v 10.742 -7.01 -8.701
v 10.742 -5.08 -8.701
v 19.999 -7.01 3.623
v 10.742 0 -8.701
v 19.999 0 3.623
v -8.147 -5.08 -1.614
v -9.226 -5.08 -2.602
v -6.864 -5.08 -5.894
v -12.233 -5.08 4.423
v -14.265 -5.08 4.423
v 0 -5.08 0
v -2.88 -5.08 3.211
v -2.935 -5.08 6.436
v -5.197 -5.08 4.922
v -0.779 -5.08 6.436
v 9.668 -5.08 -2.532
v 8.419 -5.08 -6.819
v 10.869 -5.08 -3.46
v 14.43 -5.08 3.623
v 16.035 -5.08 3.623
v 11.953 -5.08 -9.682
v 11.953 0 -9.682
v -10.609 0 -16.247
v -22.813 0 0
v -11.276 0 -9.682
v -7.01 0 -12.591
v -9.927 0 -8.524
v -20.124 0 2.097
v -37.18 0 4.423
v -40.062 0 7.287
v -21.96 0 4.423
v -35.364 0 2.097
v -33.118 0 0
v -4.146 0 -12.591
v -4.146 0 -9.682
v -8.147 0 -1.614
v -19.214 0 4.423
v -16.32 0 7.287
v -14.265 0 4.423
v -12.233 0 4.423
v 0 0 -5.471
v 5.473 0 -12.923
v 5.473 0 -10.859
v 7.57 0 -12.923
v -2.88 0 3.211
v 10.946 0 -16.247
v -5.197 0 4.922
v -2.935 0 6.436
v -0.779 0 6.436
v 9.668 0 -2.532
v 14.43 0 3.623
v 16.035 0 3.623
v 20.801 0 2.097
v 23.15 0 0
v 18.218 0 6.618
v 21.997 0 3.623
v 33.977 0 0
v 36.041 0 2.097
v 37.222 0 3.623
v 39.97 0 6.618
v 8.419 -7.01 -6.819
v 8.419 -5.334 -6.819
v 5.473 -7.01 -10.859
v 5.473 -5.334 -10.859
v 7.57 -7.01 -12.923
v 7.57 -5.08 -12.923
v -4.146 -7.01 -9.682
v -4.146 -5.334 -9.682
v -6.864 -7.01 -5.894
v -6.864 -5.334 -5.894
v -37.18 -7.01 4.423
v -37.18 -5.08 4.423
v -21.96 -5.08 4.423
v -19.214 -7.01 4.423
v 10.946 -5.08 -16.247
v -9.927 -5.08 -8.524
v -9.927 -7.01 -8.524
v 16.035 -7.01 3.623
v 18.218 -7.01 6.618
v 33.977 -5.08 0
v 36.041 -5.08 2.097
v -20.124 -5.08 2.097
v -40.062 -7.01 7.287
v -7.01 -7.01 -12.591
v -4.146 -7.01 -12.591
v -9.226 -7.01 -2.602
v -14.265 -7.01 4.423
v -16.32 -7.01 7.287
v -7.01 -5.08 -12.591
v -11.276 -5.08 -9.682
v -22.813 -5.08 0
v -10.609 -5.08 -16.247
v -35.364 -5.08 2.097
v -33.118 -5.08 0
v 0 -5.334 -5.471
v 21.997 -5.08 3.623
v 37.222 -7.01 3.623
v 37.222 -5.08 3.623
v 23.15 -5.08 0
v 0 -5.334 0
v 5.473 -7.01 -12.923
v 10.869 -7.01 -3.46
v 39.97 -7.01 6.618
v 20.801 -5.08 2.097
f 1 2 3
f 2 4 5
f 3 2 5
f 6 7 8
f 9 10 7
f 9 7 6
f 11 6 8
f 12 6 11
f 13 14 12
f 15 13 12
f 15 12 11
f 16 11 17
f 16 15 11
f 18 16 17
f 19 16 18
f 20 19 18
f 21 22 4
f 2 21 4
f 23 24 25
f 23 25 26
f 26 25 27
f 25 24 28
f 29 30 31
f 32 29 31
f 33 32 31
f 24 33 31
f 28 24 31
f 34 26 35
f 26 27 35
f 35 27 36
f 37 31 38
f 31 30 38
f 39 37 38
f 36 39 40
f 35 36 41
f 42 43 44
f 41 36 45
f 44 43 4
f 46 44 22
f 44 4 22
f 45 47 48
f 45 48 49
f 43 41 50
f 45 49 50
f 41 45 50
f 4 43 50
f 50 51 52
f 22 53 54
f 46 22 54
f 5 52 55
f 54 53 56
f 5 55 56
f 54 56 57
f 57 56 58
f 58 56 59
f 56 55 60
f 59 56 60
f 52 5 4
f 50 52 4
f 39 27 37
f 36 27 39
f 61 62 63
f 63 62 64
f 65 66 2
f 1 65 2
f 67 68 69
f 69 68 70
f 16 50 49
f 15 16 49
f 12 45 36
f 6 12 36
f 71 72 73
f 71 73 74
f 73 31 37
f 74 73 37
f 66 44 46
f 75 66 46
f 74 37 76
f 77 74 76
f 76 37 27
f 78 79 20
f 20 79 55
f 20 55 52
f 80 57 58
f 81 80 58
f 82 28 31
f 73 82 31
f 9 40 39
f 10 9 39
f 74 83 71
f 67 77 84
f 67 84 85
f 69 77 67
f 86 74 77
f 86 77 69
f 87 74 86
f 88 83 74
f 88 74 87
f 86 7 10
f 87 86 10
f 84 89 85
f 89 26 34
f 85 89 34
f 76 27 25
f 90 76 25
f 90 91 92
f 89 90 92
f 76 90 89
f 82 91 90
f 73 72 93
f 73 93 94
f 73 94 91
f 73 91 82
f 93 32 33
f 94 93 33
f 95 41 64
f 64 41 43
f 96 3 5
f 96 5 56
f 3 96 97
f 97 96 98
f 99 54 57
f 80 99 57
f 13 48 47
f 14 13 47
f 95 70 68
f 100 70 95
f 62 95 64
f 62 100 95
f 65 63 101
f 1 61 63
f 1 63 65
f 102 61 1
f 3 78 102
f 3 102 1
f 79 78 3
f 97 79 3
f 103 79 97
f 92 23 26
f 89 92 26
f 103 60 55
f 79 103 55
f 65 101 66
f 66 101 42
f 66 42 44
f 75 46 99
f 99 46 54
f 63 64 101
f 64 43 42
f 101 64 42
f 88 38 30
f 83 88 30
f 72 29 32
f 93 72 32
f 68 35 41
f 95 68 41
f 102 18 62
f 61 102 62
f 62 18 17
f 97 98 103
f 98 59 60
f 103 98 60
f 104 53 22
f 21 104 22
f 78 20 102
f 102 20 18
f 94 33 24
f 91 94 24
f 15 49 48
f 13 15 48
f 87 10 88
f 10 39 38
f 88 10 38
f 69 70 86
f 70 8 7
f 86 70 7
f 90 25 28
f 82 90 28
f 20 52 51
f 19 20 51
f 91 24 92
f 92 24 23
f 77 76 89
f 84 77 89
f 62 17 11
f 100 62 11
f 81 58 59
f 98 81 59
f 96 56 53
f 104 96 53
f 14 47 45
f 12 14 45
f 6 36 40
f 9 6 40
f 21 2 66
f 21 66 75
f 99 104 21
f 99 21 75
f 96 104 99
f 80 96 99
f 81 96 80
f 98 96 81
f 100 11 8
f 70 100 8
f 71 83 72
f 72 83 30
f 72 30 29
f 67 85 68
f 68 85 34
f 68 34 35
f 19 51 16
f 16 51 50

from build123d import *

# Parameters (mm, degrees)
F1_DEPTH = 5.08
F2_DEPTH = 7.0104
F3_DEPTH = 5.334


with BuildPart() as f1:
    # F0 (on Front) → F1 (new body)
    with BuildSketch(Plane.XZ):
        Polygon((-40.062314, 7.287229), (-37.179609, 4.422599), (-21.960379, 4.422599), (-19.214497, 4.422599), (-9.926813, -8.524094), (-7.009587, -12.590599), (-4.146443, -12.590599), (-4.146443, -9.682406), (-6.864069, -5.894135), (-9.225641, -2.60219), (-14.265077, 4.422599), (-16.320102, 7.287229), align=None)
        Polygon((8.418841, -6.8194), (5.47293, -10.858879), (5.47293, -12.923377), (7.56991, -12.923377), (10.741626, -8.700894), (19.999054, 3.623457), (21.996683, 3.623457), (37.222218, 3.623457), (39.969709, 6.618017), (18.218485, 6.618017), (16.034611, 3.623457), (10.868541, -3.460336), align=None)
        Polygon((-35.363599, 2.096692), (-33.117508, 0), (-22.81333, 0), (-10.609382, -16.247032), (-7.009587, -12.590599), (-9.926813, -8.524094), (-11.275736, -9.682406), (-20.123599, 2.096692), align=None)
        Polygon((-37.179609, 4.422599), (-35.363599, 2.096692), (-20.123599, 2.096692), (-21.960379, 4.422599), align=None)
        Polygon((-12.233077, 4.422599), (-14.265077, 4.422599), (-9.225641, -2.60219), (-8.147482, -1.614384), align=None)
        Polygon((-9.225641, -2.60219), (-6.864069, -5.894135), (0, 0), (8.418841, -6.8194), (10.868541, -3.460336), (9.668322, -2.531922), (-0.779053, 6.436089), (-2.935238, 6.436089), (-5.197461, 4.922159), (-2.880355, 3.211346), (-8.147482, -1.614384), align=None)
        Polygon((-6.864069, -5.894135), (-4.146443, -9.682406), (0, -5.470725), (5.47293, -10.858879), (8.418841, -6.8194), (0, 0), align=None)
        Polygon((10.741626, -8.700894), (7.56991, -12.923377), (10.945859, -16.247032), (23.149807, 0), (33.976993, 0), (36.041207, 2.096692), (20.801207, 2.096692), (11.953345, -9.682406), align=None)
        Polygon((21.996683, 3.623457), (20.801207, 2.096692), (36.041207, 2.096692), (37.222218, 3.623457), align=None)
        Polygon((9.668322, -2.531922), (10.868541, -3.460336), (16.034611, 3.623457), (14.429741, 3.623457), align=None)
    extrude(amount=F1_DEPTH)

    # F0 (on Front) → F2 (join)
    with BuildSketch(Plane.XZ):
        Polygon((8.418841, -6.8194), (5.47293, -10.858879), (5.47293, -12.923377), (7.56991, -12.923377), (10.741626, -8.700894), (19.999054, 3.623457), (21.996683, 3.623457), (37.222218, 3.623457), (39.969709, 6.618017), (18.218485, 6.618017), (16.034611, 3.623457), (10.868541, -3.460336), align=None)
        Polygon((-40.062314, 7.287229), (-37.179609, 4.422599), (-21.960379, 4.422599), (-19.214497, 4.422599), (-9.926813, -8.524094), (-7.009587, -12.590599), (-4.146443, -12.590599), (-4.146443, -9.682406), (-6.864069, -5.894135), (-9.225641, -2.60219), (-14.265077, 4.422599), (-16.320102, 7.287229), align=None)
    extrude(amount=F2_DEPTH)

    # F0 (on Front) → F3 (join)
    with BuildSketch(Plane.XZ):
        Polygon((-6.864069, -5.894135), (-4.146443, -9.682406), (0, -5.470725), (5.47293, -10.858879), (8.418841, -6.8194), (0, 0), align=None)
    extrude(amount=F3_DEPTH)


solid = f1.part
